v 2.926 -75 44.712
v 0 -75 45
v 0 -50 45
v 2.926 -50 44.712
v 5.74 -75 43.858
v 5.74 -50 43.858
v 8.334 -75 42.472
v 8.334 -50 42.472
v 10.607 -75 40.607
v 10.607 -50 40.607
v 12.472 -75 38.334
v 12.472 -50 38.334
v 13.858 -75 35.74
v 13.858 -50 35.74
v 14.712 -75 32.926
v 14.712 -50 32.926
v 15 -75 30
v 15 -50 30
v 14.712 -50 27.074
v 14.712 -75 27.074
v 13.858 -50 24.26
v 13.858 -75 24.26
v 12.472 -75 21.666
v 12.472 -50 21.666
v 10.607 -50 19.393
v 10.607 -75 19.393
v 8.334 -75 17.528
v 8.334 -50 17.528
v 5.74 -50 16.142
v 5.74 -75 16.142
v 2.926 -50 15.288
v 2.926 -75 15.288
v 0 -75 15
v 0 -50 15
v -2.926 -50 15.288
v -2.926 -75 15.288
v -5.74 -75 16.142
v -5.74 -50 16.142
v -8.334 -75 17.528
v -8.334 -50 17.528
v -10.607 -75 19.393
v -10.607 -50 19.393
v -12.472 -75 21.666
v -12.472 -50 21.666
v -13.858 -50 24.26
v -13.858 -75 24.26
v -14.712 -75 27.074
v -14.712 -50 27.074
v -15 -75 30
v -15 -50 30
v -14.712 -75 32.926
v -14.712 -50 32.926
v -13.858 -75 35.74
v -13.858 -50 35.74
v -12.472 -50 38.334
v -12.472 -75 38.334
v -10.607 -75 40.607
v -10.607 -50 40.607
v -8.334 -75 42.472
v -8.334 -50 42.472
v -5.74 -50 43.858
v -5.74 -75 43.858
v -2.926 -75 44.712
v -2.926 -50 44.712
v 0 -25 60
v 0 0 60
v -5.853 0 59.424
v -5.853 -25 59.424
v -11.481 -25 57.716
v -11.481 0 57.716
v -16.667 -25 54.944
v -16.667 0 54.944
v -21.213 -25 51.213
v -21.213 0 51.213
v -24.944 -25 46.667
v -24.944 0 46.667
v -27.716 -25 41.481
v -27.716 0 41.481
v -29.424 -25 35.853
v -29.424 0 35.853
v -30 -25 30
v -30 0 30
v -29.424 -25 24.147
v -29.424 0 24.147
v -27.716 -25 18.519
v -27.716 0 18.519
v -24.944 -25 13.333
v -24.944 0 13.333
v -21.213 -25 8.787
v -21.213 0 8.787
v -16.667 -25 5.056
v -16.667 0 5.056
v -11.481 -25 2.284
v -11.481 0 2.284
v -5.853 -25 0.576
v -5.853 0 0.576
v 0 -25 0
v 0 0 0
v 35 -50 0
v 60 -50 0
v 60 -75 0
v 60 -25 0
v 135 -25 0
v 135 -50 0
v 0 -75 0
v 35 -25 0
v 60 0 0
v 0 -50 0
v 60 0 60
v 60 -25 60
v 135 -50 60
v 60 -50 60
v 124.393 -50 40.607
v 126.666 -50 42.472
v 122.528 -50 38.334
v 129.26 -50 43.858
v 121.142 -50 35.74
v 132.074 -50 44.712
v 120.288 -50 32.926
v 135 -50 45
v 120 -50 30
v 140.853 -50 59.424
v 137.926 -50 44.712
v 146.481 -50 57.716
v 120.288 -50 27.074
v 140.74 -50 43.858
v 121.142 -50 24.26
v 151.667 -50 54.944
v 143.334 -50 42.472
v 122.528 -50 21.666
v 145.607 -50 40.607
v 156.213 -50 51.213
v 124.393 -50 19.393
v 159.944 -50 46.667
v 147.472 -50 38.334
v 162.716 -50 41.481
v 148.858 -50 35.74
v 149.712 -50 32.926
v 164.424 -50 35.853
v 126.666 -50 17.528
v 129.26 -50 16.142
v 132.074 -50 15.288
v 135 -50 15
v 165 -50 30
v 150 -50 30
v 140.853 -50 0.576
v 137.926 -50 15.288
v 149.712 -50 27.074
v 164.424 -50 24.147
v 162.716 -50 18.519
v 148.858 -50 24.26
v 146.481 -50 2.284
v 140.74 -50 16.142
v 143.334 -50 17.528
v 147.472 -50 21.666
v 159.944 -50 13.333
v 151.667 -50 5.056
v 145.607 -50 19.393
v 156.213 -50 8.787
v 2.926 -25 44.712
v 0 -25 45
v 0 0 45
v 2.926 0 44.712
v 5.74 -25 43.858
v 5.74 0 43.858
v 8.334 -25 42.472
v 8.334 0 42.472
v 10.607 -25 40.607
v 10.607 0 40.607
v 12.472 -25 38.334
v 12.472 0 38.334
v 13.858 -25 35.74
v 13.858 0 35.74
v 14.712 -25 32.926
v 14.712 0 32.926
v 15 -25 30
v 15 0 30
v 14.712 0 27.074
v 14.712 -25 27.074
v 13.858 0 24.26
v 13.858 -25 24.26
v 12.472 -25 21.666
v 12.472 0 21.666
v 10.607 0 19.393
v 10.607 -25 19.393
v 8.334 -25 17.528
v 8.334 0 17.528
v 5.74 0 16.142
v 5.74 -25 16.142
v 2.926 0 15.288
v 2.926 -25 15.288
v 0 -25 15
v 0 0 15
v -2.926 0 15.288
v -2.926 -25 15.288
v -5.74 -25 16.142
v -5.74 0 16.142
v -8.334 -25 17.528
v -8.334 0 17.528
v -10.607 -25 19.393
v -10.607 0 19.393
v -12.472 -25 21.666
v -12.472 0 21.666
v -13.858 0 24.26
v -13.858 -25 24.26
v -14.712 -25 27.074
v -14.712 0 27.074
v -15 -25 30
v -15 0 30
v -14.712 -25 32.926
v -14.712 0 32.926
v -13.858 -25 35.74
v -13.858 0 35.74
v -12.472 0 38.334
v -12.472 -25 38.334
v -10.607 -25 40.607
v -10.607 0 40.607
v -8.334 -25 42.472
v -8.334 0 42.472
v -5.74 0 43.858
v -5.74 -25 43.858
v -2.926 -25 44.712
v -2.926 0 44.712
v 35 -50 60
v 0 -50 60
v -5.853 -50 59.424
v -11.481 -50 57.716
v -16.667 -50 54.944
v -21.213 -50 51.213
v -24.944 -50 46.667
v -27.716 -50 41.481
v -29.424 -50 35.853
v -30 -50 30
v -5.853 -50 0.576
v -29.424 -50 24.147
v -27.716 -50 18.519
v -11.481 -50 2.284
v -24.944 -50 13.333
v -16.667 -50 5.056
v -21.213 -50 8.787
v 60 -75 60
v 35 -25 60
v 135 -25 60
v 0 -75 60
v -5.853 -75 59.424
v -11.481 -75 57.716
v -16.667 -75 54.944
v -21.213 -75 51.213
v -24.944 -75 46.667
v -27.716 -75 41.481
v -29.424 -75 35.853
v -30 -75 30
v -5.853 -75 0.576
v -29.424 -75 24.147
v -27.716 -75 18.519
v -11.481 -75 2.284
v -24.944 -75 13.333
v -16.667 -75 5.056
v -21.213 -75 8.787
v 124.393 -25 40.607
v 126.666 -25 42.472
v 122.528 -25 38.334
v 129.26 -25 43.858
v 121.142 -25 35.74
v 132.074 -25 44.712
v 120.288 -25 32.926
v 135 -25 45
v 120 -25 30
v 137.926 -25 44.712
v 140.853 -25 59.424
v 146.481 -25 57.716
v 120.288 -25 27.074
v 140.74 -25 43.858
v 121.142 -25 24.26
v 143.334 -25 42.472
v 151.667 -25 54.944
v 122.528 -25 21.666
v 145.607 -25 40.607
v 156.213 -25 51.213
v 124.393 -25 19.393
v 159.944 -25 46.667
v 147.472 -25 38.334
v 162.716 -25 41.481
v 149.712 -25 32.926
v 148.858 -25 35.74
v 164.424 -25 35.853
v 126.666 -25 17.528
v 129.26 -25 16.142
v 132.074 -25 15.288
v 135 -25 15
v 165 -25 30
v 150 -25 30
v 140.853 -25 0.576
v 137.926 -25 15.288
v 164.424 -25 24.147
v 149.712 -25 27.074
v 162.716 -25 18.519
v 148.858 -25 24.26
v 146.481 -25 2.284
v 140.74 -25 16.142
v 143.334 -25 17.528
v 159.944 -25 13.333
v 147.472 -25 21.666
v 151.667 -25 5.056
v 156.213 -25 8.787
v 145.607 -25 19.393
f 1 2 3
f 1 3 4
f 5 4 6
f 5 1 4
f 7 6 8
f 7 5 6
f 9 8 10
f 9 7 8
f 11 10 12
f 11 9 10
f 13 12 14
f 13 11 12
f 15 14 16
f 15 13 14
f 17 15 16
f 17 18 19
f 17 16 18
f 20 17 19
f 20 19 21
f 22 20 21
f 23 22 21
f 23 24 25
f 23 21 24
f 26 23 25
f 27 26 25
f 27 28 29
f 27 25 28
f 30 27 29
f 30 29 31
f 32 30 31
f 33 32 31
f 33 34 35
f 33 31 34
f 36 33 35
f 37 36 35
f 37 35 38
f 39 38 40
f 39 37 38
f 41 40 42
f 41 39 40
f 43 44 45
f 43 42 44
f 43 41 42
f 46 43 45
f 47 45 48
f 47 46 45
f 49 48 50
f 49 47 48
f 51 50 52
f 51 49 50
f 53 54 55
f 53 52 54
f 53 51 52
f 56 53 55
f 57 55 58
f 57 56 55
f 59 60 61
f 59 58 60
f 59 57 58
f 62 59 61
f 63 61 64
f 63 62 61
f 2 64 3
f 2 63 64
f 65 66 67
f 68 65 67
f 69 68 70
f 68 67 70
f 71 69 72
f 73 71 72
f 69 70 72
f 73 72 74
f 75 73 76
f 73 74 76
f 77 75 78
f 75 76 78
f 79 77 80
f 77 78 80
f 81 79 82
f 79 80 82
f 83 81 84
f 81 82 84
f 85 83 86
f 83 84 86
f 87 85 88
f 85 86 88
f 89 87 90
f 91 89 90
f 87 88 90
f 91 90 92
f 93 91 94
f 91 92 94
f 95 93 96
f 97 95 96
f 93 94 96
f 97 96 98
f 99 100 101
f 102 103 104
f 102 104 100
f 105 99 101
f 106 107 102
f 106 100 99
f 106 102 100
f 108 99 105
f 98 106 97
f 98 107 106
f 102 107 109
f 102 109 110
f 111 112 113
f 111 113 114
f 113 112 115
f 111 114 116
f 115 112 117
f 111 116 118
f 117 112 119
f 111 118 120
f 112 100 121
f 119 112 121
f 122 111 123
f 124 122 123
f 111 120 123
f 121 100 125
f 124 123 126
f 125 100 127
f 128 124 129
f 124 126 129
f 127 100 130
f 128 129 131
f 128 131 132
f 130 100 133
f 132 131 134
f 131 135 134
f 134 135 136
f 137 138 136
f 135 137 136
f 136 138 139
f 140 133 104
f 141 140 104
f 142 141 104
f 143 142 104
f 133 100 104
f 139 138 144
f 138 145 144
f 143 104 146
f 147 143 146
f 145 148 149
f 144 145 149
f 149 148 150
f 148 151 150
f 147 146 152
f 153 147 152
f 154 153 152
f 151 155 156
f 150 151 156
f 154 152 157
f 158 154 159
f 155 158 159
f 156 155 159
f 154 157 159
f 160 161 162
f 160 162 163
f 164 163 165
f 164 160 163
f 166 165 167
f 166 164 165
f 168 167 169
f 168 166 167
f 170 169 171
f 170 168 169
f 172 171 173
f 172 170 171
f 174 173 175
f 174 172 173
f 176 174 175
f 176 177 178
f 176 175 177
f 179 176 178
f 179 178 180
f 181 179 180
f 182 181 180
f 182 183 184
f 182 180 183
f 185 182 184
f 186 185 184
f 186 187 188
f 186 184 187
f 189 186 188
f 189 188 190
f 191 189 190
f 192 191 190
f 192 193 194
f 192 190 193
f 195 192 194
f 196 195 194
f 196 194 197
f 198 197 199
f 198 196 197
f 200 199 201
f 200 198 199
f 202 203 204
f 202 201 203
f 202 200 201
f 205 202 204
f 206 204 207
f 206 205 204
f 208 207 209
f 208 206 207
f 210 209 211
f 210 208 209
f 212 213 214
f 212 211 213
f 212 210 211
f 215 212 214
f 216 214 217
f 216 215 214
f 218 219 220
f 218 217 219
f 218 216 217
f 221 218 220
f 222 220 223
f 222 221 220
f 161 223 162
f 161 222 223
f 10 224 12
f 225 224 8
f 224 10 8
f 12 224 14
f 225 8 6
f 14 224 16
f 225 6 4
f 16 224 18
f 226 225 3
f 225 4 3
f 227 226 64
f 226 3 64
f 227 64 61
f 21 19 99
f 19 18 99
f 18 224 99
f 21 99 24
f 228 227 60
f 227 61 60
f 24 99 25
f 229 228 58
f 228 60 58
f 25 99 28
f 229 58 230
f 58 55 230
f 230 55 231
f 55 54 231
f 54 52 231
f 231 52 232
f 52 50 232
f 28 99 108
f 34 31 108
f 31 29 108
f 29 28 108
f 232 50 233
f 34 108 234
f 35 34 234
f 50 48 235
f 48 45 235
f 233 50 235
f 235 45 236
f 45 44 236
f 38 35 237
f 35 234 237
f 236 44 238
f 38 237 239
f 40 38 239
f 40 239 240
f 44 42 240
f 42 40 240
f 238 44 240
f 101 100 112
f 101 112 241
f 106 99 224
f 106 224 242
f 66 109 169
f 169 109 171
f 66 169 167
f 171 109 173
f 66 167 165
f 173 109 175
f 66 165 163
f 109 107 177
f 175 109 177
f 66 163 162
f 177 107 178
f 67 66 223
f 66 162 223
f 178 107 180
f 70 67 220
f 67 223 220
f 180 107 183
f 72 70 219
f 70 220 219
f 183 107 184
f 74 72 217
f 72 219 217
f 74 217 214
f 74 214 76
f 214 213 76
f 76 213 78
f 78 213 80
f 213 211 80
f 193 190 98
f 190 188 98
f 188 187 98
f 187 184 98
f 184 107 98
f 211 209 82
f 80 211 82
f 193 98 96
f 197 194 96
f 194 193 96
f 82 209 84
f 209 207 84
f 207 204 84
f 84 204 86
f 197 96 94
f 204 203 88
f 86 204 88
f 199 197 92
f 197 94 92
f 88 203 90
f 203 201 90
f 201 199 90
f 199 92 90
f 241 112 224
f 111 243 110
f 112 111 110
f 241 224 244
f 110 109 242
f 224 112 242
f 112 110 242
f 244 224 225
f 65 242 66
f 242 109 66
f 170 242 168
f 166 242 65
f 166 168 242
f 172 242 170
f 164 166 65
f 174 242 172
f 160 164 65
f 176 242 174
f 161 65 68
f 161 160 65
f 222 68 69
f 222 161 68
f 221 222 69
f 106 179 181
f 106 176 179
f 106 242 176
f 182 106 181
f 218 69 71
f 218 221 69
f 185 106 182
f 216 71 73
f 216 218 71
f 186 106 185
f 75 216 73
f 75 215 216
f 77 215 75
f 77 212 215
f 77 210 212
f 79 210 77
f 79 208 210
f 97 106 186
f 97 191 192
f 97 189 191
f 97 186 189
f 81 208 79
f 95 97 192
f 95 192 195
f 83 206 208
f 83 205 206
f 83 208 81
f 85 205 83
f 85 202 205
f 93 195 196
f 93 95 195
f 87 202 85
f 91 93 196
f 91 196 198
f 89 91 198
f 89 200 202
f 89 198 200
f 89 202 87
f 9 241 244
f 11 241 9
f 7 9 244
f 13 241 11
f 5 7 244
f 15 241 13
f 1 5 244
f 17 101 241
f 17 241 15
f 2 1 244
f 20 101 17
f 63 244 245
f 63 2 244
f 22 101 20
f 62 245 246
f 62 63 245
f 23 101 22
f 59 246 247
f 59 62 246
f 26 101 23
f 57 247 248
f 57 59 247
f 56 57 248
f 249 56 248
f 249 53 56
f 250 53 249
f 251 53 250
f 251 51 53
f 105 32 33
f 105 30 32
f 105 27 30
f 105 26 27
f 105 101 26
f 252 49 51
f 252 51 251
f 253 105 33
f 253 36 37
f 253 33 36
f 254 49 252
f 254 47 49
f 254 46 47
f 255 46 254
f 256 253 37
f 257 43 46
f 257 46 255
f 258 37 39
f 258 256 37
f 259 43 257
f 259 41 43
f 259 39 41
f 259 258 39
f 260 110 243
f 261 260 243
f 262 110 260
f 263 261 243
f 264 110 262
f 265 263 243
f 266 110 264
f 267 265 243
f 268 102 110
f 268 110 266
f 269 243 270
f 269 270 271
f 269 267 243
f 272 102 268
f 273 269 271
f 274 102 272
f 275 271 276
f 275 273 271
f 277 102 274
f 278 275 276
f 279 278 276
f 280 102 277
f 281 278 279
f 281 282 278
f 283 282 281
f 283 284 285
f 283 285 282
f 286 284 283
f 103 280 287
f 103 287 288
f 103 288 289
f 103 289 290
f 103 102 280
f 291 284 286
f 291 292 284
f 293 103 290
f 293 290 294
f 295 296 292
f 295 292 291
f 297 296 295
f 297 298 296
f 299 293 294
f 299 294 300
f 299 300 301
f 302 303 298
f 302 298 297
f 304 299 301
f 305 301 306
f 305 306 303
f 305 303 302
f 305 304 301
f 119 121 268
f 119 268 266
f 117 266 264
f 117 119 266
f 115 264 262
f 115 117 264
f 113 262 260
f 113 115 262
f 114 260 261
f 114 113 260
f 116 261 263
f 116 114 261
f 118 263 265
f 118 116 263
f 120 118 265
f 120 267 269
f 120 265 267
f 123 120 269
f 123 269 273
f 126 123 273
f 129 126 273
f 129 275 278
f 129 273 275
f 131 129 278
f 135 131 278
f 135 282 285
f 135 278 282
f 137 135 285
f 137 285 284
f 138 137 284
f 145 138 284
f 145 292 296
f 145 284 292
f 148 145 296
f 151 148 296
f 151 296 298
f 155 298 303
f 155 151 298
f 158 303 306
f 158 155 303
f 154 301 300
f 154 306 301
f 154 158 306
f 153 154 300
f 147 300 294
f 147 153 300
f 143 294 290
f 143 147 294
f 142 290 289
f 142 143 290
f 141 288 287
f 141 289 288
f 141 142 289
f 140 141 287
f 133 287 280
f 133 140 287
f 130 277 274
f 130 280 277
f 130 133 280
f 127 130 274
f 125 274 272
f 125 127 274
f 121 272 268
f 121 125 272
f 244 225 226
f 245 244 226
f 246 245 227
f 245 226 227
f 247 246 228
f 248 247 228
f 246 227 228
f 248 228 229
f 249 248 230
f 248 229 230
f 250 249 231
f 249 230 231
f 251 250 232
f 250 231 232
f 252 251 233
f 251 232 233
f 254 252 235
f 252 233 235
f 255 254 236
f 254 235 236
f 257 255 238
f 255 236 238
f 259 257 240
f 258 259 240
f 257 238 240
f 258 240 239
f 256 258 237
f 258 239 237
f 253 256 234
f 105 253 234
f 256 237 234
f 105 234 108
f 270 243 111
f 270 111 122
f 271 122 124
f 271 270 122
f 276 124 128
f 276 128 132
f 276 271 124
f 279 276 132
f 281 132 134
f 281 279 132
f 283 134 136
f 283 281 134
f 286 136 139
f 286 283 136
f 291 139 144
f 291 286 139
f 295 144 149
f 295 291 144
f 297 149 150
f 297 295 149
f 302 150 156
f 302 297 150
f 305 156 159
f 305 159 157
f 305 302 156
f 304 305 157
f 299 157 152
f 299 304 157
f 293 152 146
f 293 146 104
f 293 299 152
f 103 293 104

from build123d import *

# Parameters (mm, degrees)
BOSS_EXTRUDE1_DEPTH     = 60
BOSS_EXTRUDE2_DEPTH     = 25
BOSS_EXTRUDE3_DEPTH     = 25
BOSS_EXTRUDE4_DEPTH     = 25
CUT_EXTRUDE2_DEPTH      = 191.91883092
CUT_EXTRUDE2_DEPTH_BACK = 191.91883092
SKETCH6_R               = 15
CUT_EXTRUDE3_DEPTH      = 183.551362635
CUT_EXTRUDE3_DEPTH_BACK = 183.551362635
SKETCH7_R               = 15


with BuildPart() as part:
    # Sketch1 → Boss-Extrude1 (new body)
    with BuildSketch(Plane.XY):
        Polygon((0, 0), (60, 0), (60, -25), (135, -25), (135, -50), (60, -50), (60, -75), (0, -75), (0, -50), (35, -50), (35, -25), (0, -25), align=None)
    extrude(amount=BOSS_EXTRUDE1_DEPTH)

    # Sketch3 → Boss-Extrude2 (add)
    with BuildSketch(Plane(origin=(0, 0, 0), x_dir=(1, 0, 0), z_dir=(0, 1, 0))):
        with BuildLine():
            Line((0, 0), (0, -60))
            ThreePointArc((0, -60), (-30, -30), (0, 0))
        make_face()
    extrude(amount=-BOSS_EXTRUDE2_DEPTH)

    # Sketch4 → Boss-Extrude3 (add)
    with BuildSketch(Plane(origin=(0, -50, 0), x_dir=(1, 0, 0), z_dir=(0, 1, 0))):
        with BuildLine():
            Line((0, 0), (0, -60))
            ThreePointArc((0, -60), (-30, -30), (0, 0))
        make_face()
    extrude(amount=-BOSS_EXTRUDE3_DEPTH)

    # Sketch5 → Boss-Extrude4 (add)
    with BuildSketch(Plane(origin=(0, -25, 0), x_dir=(1, 0, 0), z_dir=(0, 1, 0))):
        with BuildLine():
            Line((135, 0), (135, -60))
            ThreePointArc((135, -60), (165, -30), (135, 0))
        make_face()
    extrude(amount=-BOSS_EXTRUDE4_DEPTH)

    # Sketch6 → Cut-Extrude2 (cut, two sides: drawn at the far end of the back side and taken through both)
    with BuildSketch(Plane(origin=(0, 0, 0), x_dir=(1, 0, 0), z_dir=(0, 1, 0)).offset(-CUT_EXTRUDE2_DEPTH_BACK)):
        with Locations(Location((0, -30, 0), (0, 0, 270))):
            Circle(SKETCH6_R)
    extrude(amount=CUT_EXTRUDE2_DEPTH + CUT_EXTRUDE2_DEPTH_BACK, mode=Mode.SUBTRACT)

    # Sketch7 → Cut-Extrude3 (cut, two sides: drawn at the far end of the back side and taken through both)
    with BuildSketch(Plane(origin=(0, -25, 0), x_dir=(1, 0, 0), z_dir=(0, 1, 0)).offset(-CUT_EXTRUDE3_DEPTH_BACK)):
        with Locations(Location((135, -30, 0), (0, 0, 180))):
            Circle(SKETCH7_R)
    extrude(amount=CUT_EXTRUDE3_DEPTH + CUT_EXTRUDE3_DEPTH_BACK, mode=Mode.SUBTRACT)


solid = part.part
